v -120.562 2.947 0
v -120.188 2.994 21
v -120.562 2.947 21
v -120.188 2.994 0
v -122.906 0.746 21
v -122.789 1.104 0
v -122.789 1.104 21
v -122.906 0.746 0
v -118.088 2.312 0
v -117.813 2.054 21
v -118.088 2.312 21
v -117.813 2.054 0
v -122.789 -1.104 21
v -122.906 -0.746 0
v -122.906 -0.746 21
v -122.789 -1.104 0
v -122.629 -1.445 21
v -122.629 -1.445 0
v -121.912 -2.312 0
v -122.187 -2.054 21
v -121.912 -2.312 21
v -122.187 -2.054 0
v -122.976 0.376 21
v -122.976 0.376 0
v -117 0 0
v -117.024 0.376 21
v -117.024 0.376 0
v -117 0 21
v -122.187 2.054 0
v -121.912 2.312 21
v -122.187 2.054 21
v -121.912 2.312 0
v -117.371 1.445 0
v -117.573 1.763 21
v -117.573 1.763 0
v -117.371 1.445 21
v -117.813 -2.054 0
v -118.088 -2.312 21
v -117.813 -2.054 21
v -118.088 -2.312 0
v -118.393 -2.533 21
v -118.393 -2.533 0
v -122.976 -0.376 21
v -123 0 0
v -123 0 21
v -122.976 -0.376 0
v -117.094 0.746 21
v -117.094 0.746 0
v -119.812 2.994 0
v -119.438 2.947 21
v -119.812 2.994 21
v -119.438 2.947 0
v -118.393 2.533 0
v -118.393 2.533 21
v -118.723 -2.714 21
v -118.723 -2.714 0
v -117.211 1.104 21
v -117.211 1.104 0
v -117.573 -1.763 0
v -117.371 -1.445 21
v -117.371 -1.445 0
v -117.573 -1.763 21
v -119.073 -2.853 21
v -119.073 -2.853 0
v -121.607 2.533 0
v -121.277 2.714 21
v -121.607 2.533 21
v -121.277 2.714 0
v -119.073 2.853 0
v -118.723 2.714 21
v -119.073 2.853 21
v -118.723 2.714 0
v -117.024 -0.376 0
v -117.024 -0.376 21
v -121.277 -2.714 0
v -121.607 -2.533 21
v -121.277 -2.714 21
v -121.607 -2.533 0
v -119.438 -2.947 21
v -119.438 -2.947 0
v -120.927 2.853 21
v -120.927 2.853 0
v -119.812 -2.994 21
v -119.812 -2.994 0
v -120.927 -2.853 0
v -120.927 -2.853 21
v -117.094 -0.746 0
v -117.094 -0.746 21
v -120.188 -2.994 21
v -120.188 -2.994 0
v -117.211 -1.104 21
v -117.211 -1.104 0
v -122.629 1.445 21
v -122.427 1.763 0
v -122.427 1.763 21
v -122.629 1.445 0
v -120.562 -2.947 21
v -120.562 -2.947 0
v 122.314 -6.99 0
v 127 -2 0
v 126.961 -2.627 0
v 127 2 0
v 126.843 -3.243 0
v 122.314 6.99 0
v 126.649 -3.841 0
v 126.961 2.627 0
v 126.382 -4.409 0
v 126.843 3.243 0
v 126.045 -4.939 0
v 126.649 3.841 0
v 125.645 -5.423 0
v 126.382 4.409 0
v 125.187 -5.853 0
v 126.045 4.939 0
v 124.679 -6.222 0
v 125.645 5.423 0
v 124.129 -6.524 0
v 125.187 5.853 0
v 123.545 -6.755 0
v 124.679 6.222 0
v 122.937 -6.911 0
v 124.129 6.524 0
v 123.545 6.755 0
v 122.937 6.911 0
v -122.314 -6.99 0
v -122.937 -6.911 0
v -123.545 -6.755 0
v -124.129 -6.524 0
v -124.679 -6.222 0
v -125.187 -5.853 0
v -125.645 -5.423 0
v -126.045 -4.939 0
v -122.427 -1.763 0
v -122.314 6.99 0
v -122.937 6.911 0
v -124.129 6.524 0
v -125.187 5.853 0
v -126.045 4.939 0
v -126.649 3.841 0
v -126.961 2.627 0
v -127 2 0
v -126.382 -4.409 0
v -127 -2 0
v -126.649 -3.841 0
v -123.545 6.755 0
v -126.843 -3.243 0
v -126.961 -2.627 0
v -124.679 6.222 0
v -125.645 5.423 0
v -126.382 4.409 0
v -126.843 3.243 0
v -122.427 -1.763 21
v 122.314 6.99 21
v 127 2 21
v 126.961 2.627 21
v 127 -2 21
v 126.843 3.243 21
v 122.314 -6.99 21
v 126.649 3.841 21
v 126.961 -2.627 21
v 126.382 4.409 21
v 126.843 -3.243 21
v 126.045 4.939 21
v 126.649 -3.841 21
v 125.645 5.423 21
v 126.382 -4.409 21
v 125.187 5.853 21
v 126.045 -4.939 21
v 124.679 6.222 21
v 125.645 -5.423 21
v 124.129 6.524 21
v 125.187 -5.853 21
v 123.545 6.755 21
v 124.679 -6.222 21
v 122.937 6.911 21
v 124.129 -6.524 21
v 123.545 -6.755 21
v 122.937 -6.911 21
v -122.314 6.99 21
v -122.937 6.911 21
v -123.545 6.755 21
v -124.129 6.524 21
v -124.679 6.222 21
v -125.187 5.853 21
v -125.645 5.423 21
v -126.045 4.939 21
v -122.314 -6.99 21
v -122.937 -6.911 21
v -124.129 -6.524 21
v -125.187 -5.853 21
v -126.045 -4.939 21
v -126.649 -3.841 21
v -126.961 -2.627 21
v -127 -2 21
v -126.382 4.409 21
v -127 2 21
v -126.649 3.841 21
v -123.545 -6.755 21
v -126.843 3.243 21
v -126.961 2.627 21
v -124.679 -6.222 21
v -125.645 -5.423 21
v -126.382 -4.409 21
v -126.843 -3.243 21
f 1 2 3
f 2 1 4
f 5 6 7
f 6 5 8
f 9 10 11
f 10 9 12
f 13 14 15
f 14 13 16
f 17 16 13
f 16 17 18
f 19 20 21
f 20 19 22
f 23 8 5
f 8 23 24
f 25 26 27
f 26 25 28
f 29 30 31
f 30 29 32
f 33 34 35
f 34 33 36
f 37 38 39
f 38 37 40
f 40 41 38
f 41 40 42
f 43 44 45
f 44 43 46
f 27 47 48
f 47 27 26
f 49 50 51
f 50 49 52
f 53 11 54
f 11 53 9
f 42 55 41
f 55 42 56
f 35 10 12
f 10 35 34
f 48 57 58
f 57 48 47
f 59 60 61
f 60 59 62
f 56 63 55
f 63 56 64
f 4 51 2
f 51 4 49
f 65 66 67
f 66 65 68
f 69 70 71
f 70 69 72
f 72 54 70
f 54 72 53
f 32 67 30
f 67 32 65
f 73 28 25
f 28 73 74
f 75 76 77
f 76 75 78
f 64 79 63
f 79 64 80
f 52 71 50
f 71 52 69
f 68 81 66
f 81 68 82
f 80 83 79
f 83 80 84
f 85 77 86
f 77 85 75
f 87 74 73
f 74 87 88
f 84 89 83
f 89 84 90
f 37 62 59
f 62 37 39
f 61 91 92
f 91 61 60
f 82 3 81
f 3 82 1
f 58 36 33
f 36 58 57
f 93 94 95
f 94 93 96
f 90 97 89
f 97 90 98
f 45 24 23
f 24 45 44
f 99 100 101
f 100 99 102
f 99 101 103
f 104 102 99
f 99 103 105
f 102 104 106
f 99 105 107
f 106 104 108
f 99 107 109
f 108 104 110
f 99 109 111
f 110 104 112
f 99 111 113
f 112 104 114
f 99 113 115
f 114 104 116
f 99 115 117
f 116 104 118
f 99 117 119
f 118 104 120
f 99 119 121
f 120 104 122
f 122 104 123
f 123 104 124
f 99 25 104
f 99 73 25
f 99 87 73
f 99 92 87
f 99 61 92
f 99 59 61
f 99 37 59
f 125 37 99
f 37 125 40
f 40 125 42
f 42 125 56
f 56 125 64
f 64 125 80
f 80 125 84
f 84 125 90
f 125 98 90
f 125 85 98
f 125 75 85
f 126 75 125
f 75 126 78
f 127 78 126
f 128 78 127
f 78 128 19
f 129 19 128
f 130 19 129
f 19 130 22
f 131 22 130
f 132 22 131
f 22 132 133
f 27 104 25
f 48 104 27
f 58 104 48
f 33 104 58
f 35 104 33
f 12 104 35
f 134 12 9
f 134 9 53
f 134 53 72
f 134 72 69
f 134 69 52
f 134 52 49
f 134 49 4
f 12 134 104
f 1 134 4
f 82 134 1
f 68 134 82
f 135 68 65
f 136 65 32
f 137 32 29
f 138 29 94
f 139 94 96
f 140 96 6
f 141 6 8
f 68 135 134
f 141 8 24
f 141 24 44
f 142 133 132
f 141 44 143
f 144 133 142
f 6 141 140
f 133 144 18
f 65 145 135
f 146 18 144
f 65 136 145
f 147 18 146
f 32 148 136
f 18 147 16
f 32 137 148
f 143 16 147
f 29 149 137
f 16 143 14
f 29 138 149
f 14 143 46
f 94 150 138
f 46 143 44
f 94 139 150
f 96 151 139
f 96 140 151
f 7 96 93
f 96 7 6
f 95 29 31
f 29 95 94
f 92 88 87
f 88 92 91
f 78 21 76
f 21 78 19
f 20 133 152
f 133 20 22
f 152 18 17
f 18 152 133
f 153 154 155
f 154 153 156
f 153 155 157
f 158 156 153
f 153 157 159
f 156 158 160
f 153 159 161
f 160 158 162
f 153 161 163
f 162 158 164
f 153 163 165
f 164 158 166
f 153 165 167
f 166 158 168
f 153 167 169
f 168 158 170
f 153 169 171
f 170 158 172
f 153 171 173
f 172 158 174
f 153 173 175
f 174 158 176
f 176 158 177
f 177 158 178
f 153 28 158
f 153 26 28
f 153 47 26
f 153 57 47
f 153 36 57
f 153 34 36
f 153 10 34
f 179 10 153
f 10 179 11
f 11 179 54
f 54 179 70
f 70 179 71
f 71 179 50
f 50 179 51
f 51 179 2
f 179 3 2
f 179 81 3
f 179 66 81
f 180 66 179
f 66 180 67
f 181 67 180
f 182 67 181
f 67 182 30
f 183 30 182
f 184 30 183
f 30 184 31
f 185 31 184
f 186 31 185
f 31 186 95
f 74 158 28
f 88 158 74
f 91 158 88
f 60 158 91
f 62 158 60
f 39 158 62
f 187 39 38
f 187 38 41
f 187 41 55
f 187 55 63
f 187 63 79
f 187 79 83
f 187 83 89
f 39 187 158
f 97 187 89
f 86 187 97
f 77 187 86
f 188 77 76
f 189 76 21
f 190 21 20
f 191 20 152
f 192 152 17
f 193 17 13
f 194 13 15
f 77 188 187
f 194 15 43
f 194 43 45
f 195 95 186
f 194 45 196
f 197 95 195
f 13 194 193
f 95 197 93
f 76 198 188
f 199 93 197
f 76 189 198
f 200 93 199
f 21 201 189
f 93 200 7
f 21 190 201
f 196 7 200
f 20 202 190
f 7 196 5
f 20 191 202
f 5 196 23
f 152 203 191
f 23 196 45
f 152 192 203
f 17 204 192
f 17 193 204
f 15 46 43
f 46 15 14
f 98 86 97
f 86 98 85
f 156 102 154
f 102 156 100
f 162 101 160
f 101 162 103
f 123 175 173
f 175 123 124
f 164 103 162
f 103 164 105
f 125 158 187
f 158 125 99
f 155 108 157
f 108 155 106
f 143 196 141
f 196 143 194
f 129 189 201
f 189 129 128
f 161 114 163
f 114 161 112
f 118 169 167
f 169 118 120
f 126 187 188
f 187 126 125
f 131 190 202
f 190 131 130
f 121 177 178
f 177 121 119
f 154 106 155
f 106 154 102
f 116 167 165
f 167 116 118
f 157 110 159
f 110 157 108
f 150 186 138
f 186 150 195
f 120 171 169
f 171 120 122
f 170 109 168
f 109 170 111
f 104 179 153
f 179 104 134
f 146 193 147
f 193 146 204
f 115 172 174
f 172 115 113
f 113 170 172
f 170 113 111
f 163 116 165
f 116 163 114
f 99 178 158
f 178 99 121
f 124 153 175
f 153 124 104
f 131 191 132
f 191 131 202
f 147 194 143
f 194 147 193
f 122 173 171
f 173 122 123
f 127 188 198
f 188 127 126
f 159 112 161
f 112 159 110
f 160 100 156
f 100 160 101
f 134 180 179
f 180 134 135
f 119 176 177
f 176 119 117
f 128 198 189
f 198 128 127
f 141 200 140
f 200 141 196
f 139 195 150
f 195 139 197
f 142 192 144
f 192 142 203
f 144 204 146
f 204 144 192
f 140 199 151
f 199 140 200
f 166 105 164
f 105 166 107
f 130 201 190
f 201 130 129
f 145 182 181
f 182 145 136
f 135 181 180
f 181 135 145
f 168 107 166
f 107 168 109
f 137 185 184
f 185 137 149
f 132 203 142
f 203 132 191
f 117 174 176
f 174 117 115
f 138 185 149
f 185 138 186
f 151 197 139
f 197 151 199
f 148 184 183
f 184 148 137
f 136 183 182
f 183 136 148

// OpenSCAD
$fn = 50;


difference() {
	union() {
		hull() {
			translate(v = [-122.0000000000, 2.0000000000, 0]) {
				cylinder(h = 21, r = 5);
			}
			translate(v = [122.0000000000, 2.0000000000, 0]) {
				cylinder(h = 21, r = 5);
			}
			translate(v = [-122.0000000000, -2.0000000000, 0]) {
				cylinder(h = 21, r = 5);
			}
			translate(v = [122.0000000000, -2.0000000000, 0]) {
				cylinder(h = 21, r = 5);
			}
		}
	}
	union() {
		translate(v = [-120.0000000000, 0.0000000000, 0]) {
			cylinder(h = 21, r = 3.0000000000);
		}
		translate(v = [-120.0000000000, 0.0000000000, 0]) {
			cylinder(h = 21, r = 1.5000000000);
		}
		translate(v = [-120.0000000000, 0.0000000000, 0]) {
			cylinder(h = 21, r = 1.5000000000);
		}
		translate(v = [-120.0000000000, 0.0000000000, 0]) {
			cylinder(h = 21, r = 1.5000000000);
		}
	}
}
